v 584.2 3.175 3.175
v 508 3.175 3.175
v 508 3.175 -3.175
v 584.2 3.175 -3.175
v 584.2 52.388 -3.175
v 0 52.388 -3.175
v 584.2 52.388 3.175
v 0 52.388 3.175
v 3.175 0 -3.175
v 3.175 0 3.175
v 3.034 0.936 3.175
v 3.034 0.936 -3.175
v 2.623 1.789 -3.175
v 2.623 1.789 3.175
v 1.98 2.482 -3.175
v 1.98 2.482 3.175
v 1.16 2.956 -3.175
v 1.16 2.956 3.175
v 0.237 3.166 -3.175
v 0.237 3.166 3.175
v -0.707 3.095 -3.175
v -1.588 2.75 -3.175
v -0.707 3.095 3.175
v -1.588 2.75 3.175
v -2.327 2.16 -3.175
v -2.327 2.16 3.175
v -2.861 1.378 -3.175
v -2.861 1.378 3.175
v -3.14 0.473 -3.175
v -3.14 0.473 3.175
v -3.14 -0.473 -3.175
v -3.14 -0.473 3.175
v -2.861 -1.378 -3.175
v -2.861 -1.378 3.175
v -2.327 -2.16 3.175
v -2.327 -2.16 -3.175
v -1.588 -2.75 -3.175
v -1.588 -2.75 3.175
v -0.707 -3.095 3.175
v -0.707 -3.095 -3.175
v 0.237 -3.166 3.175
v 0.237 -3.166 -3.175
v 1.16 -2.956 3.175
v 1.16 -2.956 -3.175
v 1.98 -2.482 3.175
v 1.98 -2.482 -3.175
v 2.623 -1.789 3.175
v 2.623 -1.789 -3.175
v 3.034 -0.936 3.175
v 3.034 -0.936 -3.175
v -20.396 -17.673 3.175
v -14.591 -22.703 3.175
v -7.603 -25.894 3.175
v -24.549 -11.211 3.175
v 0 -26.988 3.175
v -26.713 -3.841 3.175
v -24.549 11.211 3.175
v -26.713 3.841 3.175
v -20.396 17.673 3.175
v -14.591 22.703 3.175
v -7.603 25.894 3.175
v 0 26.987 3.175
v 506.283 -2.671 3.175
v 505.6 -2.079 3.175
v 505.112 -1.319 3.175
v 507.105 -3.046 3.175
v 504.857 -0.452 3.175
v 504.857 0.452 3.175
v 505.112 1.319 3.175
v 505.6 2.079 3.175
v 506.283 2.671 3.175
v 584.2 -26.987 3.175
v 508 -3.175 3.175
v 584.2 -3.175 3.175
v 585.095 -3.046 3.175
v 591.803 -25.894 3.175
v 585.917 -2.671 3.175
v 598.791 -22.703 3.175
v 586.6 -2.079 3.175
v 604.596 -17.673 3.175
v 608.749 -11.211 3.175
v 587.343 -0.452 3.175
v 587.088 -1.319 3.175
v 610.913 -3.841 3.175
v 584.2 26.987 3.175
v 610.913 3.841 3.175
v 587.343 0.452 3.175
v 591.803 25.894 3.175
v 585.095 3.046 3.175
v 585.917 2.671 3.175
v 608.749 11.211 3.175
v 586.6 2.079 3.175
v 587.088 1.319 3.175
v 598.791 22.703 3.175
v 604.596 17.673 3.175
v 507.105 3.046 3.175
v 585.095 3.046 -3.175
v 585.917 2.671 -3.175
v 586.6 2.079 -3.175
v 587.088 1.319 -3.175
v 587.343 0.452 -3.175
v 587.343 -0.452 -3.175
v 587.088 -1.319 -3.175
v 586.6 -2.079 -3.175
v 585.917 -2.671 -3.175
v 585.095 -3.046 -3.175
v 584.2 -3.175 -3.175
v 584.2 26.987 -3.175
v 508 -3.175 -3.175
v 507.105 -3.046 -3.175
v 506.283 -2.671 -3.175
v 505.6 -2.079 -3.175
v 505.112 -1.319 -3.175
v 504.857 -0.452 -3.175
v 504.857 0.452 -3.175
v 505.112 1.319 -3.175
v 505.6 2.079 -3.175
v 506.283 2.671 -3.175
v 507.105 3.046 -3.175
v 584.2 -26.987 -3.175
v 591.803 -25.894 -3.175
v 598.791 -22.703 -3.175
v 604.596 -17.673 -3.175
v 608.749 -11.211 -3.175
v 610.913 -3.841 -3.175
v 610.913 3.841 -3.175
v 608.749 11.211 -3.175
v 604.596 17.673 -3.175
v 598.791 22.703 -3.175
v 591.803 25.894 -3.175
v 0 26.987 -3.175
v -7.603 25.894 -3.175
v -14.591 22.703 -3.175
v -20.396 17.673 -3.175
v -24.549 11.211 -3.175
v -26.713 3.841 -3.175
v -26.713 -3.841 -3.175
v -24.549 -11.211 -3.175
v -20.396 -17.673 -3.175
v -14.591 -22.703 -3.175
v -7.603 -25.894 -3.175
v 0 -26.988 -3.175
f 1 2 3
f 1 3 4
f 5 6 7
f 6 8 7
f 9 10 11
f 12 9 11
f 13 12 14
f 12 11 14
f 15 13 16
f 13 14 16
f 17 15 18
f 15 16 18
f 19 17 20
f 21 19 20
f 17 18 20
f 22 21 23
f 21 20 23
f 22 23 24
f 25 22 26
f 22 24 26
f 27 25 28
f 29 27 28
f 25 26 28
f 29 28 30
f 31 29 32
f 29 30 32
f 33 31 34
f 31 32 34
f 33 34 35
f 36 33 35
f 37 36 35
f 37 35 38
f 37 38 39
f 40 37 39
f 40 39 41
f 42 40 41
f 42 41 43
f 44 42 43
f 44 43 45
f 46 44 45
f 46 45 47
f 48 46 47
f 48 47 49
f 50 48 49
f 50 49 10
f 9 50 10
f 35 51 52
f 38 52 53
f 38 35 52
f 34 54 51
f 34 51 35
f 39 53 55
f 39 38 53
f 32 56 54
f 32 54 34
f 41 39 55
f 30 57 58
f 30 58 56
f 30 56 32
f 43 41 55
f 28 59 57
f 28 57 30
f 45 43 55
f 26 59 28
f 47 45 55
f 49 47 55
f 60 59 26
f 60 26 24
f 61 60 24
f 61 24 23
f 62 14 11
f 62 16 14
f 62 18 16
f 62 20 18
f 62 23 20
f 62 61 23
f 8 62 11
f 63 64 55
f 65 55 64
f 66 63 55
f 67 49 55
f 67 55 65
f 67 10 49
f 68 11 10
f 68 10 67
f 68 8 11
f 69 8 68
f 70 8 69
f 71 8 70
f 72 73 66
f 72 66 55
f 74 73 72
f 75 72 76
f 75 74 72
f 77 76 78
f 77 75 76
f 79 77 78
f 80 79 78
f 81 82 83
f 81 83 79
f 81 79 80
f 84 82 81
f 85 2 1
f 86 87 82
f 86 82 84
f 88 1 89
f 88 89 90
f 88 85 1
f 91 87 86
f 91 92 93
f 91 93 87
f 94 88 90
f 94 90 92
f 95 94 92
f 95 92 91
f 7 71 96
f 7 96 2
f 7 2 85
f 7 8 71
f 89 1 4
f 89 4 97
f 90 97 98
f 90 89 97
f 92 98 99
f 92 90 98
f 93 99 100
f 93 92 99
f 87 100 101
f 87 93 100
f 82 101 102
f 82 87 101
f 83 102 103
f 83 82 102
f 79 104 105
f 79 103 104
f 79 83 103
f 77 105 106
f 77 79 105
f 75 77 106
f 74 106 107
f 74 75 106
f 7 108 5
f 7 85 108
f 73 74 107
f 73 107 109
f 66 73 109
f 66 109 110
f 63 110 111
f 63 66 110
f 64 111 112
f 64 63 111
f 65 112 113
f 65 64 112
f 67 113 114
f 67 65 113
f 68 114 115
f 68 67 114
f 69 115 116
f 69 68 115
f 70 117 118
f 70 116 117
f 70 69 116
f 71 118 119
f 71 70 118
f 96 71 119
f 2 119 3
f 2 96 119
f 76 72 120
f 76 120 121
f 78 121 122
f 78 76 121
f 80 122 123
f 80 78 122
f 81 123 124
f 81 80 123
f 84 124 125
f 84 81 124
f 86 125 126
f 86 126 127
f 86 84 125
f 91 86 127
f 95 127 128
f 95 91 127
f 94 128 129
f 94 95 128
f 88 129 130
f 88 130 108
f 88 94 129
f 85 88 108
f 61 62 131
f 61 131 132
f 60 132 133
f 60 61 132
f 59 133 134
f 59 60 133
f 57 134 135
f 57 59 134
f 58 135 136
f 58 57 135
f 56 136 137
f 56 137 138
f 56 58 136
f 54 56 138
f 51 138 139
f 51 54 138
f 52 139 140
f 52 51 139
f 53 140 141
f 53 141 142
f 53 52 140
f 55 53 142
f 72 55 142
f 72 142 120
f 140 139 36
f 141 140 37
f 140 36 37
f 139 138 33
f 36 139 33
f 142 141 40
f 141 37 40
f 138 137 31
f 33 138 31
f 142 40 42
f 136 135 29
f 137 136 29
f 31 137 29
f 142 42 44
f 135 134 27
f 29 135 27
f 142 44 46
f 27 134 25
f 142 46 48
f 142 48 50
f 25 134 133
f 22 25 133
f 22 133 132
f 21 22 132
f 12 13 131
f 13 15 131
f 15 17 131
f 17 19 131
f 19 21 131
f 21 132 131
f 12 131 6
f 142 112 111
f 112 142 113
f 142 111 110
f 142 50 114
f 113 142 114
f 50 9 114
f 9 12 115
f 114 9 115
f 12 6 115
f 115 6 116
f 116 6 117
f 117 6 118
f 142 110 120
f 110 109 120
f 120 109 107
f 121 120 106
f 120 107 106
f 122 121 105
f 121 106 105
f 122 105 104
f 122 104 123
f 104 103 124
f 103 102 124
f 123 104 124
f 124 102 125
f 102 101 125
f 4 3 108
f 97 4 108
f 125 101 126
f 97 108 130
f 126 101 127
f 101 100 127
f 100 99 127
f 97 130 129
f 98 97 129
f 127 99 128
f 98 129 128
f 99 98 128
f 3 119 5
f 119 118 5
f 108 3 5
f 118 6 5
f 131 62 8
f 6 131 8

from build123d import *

# Parameters (mm, degrees)
SKETCH1_W           = 584.2
SKETCH1_H           = 25.4
BOSS_EXTRUDE1_DEPTH = 3.175
SKETCH2_R           = 3.175
CUT_EXTRUDE1_DEPTH  = 614.461435473


with BuildPart() as part:
    # Sketch1 → Boss-Extrude1 (new, symmetric)
    with BuildSketch(Plane.XY):
        with Locations((292.1, 39.6875)):
            Rectangle(SKETCH1_W, SKETCH1_H)
        with BuildLine():
            Line((0, -26.9875), (584.2, -26.9875))
            ThreePointArc((584.2, -26.9875), (611.1875, 0), (584.2, 26.9875))
            Line((584.2, 26.9875), (0, 26.9875))
            ThreePointArc((0, 26.9875), (-26.9875, 0), (0, -26.9875))
        make_face()
    extrude(amount=BOSS_EXTRUDE1_DEPTH, both=True)

    # Sketch2 → Cut-Extrude1 (cut, through all)
    with BuildSketch(Plane.XY.offset(3.175)):
        Circle(SKETCH2_R)
        with BuildLine():
            Line((508, 3.175), (584.2, 3.175))
            ThreePointArc((584.2, 3.175), (587.375, 0), (584.2, -3.175))
            Line((584.2, -3.175), (508, -3.175))
            ThreePointArc((508, -3.175), (504.825, 0), (508, 3.175))
        make_face()
    extrude(amount=-CUT_EXTRUDE1_DEPTH, mode=Mode.SUBTRACT)


solid = part.part
